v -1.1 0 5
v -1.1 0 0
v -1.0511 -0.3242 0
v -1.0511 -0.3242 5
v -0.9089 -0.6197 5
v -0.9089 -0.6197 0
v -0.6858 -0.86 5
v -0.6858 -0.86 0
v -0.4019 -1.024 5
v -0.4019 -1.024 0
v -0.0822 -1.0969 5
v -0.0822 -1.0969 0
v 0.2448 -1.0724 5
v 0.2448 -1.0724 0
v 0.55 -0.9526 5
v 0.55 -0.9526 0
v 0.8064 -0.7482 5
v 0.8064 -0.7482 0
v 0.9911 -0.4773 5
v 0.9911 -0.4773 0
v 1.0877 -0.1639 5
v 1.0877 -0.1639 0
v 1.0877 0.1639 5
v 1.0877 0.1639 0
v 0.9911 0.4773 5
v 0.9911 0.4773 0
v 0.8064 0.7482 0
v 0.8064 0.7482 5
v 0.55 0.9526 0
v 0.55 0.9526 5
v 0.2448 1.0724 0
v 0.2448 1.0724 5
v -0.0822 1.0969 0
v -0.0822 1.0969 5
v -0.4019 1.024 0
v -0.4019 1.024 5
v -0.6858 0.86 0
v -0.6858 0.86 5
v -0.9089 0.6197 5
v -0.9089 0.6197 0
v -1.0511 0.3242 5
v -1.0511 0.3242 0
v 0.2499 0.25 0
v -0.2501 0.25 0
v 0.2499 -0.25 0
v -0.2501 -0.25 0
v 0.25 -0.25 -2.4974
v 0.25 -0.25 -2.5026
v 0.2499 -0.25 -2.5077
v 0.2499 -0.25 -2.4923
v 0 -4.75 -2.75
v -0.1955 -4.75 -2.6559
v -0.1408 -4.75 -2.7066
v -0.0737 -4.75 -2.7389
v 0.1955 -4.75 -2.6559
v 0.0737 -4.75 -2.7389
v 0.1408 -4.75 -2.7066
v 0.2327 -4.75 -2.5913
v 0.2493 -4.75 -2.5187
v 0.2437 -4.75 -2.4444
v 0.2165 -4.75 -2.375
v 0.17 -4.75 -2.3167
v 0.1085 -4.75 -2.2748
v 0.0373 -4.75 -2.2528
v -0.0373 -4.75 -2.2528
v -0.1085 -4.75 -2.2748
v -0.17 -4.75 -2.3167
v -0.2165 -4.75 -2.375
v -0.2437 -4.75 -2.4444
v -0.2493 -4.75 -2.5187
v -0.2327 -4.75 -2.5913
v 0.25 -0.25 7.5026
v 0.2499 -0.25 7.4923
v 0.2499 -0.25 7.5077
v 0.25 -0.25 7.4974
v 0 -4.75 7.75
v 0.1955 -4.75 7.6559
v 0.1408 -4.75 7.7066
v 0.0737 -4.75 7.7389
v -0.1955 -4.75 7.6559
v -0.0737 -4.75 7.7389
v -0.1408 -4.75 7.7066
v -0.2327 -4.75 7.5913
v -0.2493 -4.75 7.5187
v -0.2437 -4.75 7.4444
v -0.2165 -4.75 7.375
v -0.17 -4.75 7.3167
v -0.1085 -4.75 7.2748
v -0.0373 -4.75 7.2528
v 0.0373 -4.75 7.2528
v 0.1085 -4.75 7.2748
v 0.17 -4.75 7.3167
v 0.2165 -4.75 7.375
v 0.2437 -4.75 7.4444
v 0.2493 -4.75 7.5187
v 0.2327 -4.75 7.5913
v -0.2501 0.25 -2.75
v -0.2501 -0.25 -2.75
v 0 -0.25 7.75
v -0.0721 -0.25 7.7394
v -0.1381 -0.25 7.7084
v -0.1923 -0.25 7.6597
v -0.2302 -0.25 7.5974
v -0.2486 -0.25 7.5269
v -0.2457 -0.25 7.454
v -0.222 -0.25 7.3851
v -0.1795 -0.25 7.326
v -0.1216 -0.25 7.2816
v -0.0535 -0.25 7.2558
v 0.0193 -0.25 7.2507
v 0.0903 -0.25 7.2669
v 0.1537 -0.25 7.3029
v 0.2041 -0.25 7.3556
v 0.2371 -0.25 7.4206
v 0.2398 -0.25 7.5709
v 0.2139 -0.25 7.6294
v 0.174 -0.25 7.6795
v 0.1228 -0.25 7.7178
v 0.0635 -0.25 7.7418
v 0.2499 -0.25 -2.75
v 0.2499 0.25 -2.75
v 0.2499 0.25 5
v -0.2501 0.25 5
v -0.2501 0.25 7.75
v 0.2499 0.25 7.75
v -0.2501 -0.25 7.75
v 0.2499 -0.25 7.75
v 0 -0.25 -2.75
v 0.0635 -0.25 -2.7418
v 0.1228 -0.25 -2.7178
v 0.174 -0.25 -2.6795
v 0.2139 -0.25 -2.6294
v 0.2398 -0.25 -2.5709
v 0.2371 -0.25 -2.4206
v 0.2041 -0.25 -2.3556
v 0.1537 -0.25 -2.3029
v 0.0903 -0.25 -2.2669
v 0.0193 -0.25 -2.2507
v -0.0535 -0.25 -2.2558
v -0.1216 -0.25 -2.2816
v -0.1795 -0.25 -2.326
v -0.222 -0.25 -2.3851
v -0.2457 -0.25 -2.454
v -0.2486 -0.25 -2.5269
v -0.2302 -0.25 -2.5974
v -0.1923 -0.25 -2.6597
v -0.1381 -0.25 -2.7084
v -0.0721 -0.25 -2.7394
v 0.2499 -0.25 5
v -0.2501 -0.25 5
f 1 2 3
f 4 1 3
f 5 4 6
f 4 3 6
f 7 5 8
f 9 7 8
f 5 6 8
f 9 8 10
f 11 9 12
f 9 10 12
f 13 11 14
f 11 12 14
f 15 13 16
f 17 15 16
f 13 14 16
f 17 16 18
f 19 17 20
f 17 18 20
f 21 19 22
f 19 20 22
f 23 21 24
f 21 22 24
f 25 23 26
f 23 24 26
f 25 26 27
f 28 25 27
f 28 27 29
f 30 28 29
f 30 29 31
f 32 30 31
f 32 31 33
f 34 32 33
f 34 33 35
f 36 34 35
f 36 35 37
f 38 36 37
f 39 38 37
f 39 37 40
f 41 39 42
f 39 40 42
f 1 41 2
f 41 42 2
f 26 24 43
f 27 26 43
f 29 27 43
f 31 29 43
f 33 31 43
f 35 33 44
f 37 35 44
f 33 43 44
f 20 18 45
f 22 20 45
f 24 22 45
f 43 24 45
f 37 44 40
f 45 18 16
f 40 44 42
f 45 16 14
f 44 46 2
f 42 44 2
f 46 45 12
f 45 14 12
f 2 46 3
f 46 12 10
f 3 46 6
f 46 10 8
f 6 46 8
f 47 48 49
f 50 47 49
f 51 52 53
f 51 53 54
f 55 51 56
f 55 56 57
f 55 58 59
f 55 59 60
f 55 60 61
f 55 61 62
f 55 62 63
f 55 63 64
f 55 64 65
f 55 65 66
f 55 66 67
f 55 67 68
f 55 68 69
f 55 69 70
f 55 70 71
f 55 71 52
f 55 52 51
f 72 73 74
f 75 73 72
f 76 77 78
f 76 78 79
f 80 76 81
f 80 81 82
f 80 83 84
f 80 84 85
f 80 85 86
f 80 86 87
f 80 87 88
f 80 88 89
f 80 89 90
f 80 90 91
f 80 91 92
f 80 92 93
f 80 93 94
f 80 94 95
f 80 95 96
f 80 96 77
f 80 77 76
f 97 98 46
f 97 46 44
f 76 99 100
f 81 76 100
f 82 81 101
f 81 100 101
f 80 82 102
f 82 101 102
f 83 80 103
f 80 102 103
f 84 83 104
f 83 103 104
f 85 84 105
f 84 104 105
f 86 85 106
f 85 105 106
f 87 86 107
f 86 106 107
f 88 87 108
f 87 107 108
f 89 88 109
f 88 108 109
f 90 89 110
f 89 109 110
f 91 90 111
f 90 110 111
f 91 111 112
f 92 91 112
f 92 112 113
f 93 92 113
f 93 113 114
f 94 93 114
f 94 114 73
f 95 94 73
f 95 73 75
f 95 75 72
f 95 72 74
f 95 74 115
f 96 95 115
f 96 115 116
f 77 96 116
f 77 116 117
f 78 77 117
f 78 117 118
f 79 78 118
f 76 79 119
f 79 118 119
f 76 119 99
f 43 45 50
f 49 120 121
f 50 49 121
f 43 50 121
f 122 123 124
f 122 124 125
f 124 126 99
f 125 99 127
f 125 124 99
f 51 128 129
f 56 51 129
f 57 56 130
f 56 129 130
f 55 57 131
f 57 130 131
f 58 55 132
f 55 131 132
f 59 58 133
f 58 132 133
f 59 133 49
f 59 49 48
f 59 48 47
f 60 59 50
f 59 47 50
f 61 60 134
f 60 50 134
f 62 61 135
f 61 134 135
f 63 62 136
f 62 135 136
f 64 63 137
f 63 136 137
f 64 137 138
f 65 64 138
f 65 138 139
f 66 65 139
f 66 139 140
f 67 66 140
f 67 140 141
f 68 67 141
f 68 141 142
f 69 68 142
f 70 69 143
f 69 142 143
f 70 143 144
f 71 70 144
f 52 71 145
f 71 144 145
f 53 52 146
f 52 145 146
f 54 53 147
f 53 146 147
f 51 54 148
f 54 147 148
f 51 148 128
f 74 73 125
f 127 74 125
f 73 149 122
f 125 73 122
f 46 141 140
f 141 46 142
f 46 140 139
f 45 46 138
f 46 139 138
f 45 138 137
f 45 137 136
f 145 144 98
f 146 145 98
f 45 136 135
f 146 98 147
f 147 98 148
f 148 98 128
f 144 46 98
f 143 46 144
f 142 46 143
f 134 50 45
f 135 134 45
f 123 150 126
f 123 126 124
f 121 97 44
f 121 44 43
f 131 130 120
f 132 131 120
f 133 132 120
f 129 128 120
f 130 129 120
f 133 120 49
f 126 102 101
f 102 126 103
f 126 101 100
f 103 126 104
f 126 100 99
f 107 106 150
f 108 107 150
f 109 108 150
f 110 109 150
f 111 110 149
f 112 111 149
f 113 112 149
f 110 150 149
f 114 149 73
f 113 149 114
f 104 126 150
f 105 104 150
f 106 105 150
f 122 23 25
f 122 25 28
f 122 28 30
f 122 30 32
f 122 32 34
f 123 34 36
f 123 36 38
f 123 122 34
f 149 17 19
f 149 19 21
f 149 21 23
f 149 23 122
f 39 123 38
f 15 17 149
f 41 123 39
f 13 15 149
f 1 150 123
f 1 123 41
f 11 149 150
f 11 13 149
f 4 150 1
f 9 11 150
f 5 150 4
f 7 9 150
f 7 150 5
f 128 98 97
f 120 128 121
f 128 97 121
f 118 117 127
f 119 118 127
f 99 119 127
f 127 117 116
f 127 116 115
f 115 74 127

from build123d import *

# Parameters (mm, degrees)
SKETCH_1_R           = 1.1
EXTRUDE_1_DEPTH      = 5
EXTRUDE_2_DEPTH      = 2.75
EXTRUDE_2_DEPTH_BACK = 7.75
SKETCH_2_W           = 0.5
SKETCH_2_H           = 0.5
SKETCH_3_R           = 0.25
EXTRUDE_3_DEPTH      = 4.5


with BuildPart() as part:
    # Эскиз1 → Вытянуть1 (new body)
    with BuildSketch(Plane.XY):
        Circle(SKETCH_1_R)
    extrude(amount=EXTRUDE_1_DEPTH)

    # Эскиз2 → Вытянуть2 (add, two sides: drawn at the far end of the back side and taken through both)
    with BuildSketch(Plane.XY.offset(5).offset(-EXTRUDE_2_DEPTH_BACK)):
        with Locations((-0.000117439, 0)):
            Rectangle(SKETCH_2_W, SKETCH_2_H)
    extrude(amount=EXTRUDE_2_DEPTH + EXTRUDE_2_DEPTH_BACK)

    # Эскиз3 → Вытянуть3 (add)
    with BuildSketch(Plane.XZ.offset(0.25)):
        with Locations((0, 7.5)):
            Circle(SKETCH_3_R)
        with Locations((0, -2.5)):
            Circle(SKETCH_3_R)
    extrude(amount=EXTRUDE_3_DEPTH)


solid = part.part
